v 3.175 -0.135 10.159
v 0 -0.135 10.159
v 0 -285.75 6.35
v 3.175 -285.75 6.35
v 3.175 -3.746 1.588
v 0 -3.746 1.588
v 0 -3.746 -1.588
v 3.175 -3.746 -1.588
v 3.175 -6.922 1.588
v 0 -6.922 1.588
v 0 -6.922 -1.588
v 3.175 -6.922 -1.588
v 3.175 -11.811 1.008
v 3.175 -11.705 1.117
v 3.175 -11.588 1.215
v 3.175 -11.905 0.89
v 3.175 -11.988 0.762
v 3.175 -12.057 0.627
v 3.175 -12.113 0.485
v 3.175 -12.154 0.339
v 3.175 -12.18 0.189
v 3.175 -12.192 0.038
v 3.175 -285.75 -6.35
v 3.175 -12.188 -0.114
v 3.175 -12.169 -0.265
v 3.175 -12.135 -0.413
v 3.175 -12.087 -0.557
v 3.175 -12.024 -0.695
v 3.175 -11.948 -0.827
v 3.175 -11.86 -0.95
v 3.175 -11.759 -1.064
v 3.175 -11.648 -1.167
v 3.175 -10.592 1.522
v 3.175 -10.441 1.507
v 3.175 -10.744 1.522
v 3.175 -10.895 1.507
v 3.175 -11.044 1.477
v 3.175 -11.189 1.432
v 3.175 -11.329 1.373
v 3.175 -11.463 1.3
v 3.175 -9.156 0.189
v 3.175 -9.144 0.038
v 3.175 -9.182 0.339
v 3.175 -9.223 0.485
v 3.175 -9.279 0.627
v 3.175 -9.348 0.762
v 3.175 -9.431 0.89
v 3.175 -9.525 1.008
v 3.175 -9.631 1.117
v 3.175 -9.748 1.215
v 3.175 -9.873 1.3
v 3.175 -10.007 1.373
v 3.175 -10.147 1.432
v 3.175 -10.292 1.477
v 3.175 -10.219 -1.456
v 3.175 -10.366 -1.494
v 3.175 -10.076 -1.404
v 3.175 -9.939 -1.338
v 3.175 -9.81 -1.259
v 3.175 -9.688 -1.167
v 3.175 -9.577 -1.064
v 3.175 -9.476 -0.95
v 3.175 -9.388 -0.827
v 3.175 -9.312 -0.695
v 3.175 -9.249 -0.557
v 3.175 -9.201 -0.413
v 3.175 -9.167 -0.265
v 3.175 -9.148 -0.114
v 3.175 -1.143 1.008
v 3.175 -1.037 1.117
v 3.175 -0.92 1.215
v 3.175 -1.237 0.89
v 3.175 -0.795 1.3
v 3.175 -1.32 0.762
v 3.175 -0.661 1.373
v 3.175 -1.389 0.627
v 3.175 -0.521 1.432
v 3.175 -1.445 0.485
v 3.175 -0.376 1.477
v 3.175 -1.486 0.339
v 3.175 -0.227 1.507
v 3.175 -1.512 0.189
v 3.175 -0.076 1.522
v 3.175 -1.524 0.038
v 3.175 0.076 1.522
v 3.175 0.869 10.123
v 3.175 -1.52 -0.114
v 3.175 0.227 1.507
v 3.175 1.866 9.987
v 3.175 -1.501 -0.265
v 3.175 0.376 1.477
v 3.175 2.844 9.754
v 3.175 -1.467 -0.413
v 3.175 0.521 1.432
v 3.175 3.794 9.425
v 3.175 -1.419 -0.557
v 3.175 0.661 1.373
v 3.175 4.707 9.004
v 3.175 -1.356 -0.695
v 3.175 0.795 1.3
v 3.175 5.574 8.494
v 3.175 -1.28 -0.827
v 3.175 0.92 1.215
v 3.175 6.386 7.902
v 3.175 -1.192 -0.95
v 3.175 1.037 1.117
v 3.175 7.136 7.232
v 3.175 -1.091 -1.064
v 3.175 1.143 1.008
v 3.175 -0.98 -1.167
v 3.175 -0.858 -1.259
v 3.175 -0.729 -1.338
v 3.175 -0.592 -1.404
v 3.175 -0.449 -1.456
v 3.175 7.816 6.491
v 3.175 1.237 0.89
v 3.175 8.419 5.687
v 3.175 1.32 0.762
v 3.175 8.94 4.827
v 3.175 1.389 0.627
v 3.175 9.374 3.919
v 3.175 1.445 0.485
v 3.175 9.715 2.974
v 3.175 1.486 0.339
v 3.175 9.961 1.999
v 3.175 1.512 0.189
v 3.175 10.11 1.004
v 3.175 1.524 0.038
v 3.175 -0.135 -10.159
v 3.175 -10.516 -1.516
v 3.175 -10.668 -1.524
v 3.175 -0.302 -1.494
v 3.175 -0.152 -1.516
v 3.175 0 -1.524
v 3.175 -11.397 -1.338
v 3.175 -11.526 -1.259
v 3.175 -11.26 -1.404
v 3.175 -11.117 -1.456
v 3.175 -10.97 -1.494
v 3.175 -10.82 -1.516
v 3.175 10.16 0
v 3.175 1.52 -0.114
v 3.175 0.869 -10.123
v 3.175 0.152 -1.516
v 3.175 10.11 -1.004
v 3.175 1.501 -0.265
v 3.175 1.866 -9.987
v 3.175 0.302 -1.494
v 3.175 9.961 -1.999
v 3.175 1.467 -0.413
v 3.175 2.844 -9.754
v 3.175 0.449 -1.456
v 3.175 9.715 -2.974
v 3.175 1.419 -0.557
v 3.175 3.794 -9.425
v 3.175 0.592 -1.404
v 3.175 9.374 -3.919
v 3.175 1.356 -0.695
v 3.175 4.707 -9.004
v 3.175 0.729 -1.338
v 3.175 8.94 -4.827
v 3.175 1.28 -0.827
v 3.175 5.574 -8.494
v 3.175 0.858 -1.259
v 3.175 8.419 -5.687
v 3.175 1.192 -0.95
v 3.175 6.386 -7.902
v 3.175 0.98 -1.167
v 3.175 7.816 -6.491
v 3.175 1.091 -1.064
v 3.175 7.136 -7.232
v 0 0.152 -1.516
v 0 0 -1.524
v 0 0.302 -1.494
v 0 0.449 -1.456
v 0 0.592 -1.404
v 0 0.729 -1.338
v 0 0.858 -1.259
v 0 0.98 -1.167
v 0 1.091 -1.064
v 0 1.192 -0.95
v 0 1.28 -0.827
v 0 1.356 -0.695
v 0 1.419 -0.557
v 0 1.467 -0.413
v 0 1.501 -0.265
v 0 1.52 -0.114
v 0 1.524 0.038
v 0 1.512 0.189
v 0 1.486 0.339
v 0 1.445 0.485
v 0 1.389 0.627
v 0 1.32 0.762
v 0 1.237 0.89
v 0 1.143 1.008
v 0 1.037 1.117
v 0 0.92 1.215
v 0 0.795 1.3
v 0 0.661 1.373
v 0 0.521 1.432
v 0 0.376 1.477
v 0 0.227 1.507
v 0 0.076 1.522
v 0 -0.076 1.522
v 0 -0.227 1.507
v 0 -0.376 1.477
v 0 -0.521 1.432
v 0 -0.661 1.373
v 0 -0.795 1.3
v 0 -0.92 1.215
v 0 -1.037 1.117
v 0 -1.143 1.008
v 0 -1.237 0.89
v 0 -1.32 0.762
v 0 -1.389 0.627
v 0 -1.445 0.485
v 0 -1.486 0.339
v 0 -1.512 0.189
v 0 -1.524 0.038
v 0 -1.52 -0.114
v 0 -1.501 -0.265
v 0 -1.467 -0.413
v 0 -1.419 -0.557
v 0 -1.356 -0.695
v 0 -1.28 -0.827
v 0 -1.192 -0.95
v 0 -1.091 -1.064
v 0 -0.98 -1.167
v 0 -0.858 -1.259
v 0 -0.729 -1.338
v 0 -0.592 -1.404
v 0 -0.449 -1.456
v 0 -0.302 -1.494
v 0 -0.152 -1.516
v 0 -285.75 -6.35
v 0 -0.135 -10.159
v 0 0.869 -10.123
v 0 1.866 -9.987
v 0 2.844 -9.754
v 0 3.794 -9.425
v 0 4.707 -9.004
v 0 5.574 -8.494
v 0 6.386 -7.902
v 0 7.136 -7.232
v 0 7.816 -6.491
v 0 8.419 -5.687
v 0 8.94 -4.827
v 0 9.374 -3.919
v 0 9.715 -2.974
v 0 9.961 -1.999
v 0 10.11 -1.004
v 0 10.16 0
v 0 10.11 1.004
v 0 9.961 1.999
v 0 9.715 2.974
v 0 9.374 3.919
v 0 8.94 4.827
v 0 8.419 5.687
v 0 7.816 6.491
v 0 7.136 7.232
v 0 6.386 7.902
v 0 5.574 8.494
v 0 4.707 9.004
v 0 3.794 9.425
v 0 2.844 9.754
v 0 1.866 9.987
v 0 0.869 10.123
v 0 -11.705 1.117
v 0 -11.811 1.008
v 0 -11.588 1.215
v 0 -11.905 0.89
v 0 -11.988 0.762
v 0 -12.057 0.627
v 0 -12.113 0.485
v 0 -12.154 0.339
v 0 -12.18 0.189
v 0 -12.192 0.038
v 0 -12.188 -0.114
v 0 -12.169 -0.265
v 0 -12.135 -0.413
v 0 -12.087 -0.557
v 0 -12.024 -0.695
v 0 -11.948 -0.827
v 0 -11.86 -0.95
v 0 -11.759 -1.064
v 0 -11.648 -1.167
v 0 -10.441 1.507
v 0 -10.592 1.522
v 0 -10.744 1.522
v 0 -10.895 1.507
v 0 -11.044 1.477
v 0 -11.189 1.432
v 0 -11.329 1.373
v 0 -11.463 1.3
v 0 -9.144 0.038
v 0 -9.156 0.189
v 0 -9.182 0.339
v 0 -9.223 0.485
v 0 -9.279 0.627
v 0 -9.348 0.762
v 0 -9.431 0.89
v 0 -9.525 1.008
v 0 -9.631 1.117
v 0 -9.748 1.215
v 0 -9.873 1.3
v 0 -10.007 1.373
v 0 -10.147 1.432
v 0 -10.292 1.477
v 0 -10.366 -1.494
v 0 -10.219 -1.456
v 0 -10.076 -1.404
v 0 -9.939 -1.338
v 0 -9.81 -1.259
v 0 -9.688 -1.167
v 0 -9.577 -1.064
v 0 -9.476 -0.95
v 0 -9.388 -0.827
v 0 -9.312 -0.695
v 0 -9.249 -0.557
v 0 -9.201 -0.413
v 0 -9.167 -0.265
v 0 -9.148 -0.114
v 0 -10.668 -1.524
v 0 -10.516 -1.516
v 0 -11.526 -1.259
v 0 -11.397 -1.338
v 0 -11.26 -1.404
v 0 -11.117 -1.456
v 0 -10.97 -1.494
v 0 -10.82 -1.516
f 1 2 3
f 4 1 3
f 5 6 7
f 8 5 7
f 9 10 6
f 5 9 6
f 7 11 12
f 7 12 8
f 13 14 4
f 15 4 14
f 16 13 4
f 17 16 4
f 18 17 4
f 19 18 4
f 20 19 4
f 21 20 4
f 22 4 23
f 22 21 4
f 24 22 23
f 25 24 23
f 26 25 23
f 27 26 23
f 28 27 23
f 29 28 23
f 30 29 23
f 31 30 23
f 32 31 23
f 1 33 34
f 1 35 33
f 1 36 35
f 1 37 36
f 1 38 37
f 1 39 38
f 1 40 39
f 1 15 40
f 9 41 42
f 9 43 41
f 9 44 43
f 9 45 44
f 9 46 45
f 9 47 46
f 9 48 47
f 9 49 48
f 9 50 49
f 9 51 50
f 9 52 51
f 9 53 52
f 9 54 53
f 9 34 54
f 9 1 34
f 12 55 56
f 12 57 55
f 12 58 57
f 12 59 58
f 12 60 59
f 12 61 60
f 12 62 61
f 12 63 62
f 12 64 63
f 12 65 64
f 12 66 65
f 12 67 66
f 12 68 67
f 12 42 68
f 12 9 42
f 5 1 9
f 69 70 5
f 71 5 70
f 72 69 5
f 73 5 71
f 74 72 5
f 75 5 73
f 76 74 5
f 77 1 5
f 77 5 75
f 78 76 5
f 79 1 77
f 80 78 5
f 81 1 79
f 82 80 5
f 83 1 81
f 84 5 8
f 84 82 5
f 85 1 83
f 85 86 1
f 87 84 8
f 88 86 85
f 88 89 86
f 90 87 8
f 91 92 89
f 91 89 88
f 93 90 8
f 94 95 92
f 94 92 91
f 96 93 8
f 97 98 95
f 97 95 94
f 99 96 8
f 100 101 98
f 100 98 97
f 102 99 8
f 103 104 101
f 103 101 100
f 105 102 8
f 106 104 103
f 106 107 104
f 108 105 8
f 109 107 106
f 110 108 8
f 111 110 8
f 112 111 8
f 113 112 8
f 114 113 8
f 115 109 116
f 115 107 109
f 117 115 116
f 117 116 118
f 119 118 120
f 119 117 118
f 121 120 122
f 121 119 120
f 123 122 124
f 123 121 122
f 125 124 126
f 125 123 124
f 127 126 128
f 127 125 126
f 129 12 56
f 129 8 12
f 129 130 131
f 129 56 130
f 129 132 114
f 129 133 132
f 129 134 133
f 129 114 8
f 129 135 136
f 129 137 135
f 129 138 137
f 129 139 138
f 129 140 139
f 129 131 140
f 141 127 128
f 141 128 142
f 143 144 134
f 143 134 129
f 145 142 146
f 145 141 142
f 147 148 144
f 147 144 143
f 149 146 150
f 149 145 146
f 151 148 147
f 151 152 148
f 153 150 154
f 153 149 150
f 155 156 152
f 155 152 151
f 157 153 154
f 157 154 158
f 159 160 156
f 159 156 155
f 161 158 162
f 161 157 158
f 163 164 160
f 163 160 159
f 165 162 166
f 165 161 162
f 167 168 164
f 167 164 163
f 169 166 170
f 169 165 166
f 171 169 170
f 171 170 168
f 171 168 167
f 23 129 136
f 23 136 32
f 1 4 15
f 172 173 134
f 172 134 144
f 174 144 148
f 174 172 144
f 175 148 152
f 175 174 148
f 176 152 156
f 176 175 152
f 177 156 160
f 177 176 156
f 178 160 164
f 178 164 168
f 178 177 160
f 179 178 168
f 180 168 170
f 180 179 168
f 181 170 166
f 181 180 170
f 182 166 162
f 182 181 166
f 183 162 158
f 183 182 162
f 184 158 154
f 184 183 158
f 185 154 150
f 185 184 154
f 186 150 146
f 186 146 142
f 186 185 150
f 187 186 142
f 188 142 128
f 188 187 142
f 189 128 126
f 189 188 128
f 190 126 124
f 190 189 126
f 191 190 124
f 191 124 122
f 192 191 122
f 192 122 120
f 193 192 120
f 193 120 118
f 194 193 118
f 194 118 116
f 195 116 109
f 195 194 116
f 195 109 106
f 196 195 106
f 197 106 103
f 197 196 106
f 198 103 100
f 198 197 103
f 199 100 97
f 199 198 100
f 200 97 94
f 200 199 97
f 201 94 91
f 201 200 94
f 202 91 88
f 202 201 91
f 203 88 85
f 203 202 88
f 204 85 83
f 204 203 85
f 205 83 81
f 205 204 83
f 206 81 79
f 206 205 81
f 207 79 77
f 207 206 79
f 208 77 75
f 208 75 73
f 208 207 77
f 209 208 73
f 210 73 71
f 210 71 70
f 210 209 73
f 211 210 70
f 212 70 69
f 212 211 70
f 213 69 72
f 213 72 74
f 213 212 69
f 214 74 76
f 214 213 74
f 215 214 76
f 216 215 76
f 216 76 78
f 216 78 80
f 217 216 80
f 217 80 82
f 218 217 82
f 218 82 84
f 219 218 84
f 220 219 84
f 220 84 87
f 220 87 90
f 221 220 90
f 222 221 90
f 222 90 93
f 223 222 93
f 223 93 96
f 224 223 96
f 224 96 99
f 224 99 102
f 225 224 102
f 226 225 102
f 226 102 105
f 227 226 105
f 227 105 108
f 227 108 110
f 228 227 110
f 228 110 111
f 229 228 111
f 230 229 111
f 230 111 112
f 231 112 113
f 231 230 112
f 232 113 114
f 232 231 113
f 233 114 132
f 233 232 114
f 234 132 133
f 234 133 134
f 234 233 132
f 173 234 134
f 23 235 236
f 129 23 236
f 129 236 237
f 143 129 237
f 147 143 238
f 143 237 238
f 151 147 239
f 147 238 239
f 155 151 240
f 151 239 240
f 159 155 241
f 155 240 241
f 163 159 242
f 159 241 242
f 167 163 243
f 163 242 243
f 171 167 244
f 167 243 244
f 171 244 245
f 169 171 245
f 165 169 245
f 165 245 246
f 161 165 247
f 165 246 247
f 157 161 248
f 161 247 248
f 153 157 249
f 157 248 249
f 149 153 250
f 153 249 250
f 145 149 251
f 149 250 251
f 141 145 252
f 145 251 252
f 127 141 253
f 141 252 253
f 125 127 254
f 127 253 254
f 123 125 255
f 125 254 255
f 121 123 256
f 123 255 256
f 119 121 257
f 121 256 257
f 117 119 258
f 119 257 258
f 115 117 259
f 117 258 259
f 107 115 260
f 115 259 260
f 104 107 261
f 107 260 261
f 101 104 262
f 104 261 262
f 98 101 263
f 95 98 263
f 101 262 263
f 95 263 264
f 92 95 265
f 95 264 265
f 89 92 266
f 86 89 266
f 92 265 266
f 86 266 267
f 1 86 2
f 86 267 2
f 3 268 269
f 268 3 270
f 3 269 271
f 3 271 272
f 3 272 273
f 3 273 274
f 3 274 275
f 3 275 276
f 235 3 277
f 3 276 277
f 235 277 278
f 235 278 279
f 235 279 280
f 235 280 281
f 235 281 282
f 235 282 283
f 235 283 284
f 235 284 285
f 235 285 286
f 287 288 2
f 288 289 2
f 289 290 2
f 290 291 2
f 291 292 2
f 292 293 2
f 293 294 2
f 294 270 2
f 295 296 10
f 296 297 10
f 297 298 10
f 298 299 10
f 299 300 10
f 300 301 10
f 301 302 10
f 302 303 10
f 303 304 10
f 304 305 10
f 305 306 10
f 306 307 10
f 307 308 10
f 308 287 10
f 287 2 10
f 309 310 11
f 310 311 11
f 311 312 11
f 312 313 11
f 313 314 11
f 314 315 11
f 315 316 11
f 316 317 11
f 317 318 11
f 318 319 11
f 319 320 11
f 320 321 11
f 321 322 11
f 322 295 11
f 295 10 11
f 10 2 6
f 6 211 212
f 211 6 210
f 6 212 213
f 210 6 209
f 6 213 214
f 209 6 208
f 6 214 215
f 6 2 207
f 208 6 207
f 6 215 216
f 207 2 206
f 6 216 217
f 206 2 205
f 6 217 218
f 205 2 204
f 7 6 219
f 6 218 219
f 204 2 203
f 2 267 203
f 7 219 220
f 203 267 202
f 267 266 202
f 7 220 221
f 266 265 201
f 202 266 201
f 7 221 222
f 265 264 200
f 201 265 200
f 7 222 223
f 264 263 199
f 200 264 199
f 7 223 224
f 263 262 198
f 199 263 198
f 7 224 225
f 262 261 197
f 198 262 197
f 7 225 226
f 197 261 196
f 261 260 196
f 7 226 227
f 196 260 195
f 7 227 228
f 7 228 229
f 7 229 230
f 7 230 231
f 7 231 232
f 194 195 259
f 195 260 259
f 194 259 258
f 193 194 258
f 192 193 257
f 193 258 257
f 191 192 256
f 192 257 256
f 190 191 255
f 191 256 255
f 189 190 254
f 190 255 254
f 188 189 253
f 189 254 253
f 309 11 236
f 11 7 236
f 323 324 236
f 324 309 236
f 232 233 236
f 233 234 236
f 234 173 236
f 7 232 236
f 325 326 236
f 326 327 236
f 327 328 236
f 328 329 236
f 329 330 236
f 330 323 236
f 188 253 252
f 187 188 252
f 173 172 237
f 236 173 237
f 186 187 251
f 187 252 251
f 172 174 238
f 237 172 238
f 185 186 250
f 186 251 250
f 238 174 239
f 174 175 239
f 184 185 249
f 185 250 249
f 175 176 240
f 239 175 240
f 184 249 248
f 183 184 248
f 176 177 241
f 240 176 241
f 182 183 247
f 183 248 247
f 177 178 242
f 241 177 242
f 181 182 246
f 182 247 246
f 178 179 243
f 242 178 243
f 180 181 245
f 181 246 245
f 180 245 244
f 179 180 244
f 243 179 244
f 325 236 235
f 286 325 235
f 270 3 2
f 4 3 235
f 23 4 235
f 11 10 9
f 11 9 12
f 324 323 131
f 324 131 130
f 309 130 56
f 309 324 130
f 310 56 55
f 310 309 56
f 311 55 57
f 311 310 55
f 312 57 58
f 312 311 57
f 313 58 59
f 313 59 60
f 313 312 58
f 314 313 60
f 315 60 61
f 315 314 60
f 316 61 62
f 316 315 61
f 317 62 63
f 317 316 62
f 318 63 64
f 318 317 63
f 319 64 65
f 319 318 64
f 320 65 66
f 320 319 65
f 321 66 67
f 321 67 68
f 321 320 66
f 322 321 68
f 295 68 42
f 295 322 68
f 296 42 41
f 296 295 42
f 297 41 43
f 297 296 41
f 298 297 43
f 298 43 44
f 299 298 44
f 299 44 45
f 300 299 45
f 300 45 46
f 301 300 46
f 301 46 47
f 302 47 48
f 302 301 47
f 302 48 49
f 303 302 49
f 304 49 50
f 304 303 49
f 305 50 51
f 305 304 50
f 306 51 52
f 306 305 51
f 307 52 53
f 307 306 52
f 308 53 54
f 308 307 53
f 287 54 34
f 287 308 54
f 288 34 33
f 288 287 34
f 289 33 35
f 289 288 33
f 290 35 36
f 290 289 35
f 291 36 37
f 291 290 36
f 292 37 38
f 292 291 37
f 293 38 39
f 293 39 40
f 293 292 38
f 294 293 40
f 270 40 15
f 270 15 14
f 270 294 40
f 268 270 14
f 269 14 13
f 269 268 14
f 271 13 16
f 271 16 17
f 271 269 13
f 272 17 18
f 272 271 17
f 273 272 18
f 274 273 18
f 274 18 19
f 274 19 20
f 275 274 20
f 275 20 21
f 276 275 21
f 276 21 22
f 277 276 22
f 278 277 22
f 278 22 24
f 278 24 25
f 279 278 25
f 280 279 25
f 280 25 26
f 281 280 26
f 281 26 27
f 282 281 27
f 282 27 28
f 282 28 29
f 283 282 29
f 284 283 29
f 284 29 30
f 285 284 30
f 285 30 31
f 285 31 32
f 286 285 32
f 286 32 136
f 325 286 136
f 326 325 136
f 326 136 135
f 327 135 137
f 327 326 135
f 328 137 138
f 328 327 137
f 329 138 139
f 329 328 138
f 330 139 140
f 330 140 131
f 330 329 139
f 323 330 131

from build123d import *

# Parameters (mm, degrees)
SKETCH1_R           = 1.524
SKETCH1_W           = 3.175
SKETCH1_H           = 3.175
BOSS_EXTRUDE1_DEPTH = 3.175


with BuildPart() as part:
    # Sketch1 → Boss-Extrude1 (new body)
    with BuildSketch(Plane(origin=(0, 0, 0), x_dir=(0, 0, -1), z_dir=(1, 0, 0))):
        with BuildLine():
            Line((-6.35, -285.75), (6.35, -285.75))
            Line((6.35, -285.75), (10.159096581, -0.135486743))
            ThreePointArc((10.159096581, -0.135486743), (0, 10.16), (-10.159096581, -0.135486743))
            Line((-10.159096581, -0.135486743), (-6.35, -285.75))
        make_face()
        Circle(SKETCH1_R, mode=Mode.SUBTRACT)
        with Locations((0, -10.668)):
            Circle(SKETCH1_R, mode=Mode.SUBTRACT)
        with Locations((0, -5.334)):
            Rectangle(SKETCH1_W, SKETCH1_H, mode=Mode.SUBTRACT)
    extrude(amount=BOSS_EXTRUDE1_DEPTH)


solid = part.part
